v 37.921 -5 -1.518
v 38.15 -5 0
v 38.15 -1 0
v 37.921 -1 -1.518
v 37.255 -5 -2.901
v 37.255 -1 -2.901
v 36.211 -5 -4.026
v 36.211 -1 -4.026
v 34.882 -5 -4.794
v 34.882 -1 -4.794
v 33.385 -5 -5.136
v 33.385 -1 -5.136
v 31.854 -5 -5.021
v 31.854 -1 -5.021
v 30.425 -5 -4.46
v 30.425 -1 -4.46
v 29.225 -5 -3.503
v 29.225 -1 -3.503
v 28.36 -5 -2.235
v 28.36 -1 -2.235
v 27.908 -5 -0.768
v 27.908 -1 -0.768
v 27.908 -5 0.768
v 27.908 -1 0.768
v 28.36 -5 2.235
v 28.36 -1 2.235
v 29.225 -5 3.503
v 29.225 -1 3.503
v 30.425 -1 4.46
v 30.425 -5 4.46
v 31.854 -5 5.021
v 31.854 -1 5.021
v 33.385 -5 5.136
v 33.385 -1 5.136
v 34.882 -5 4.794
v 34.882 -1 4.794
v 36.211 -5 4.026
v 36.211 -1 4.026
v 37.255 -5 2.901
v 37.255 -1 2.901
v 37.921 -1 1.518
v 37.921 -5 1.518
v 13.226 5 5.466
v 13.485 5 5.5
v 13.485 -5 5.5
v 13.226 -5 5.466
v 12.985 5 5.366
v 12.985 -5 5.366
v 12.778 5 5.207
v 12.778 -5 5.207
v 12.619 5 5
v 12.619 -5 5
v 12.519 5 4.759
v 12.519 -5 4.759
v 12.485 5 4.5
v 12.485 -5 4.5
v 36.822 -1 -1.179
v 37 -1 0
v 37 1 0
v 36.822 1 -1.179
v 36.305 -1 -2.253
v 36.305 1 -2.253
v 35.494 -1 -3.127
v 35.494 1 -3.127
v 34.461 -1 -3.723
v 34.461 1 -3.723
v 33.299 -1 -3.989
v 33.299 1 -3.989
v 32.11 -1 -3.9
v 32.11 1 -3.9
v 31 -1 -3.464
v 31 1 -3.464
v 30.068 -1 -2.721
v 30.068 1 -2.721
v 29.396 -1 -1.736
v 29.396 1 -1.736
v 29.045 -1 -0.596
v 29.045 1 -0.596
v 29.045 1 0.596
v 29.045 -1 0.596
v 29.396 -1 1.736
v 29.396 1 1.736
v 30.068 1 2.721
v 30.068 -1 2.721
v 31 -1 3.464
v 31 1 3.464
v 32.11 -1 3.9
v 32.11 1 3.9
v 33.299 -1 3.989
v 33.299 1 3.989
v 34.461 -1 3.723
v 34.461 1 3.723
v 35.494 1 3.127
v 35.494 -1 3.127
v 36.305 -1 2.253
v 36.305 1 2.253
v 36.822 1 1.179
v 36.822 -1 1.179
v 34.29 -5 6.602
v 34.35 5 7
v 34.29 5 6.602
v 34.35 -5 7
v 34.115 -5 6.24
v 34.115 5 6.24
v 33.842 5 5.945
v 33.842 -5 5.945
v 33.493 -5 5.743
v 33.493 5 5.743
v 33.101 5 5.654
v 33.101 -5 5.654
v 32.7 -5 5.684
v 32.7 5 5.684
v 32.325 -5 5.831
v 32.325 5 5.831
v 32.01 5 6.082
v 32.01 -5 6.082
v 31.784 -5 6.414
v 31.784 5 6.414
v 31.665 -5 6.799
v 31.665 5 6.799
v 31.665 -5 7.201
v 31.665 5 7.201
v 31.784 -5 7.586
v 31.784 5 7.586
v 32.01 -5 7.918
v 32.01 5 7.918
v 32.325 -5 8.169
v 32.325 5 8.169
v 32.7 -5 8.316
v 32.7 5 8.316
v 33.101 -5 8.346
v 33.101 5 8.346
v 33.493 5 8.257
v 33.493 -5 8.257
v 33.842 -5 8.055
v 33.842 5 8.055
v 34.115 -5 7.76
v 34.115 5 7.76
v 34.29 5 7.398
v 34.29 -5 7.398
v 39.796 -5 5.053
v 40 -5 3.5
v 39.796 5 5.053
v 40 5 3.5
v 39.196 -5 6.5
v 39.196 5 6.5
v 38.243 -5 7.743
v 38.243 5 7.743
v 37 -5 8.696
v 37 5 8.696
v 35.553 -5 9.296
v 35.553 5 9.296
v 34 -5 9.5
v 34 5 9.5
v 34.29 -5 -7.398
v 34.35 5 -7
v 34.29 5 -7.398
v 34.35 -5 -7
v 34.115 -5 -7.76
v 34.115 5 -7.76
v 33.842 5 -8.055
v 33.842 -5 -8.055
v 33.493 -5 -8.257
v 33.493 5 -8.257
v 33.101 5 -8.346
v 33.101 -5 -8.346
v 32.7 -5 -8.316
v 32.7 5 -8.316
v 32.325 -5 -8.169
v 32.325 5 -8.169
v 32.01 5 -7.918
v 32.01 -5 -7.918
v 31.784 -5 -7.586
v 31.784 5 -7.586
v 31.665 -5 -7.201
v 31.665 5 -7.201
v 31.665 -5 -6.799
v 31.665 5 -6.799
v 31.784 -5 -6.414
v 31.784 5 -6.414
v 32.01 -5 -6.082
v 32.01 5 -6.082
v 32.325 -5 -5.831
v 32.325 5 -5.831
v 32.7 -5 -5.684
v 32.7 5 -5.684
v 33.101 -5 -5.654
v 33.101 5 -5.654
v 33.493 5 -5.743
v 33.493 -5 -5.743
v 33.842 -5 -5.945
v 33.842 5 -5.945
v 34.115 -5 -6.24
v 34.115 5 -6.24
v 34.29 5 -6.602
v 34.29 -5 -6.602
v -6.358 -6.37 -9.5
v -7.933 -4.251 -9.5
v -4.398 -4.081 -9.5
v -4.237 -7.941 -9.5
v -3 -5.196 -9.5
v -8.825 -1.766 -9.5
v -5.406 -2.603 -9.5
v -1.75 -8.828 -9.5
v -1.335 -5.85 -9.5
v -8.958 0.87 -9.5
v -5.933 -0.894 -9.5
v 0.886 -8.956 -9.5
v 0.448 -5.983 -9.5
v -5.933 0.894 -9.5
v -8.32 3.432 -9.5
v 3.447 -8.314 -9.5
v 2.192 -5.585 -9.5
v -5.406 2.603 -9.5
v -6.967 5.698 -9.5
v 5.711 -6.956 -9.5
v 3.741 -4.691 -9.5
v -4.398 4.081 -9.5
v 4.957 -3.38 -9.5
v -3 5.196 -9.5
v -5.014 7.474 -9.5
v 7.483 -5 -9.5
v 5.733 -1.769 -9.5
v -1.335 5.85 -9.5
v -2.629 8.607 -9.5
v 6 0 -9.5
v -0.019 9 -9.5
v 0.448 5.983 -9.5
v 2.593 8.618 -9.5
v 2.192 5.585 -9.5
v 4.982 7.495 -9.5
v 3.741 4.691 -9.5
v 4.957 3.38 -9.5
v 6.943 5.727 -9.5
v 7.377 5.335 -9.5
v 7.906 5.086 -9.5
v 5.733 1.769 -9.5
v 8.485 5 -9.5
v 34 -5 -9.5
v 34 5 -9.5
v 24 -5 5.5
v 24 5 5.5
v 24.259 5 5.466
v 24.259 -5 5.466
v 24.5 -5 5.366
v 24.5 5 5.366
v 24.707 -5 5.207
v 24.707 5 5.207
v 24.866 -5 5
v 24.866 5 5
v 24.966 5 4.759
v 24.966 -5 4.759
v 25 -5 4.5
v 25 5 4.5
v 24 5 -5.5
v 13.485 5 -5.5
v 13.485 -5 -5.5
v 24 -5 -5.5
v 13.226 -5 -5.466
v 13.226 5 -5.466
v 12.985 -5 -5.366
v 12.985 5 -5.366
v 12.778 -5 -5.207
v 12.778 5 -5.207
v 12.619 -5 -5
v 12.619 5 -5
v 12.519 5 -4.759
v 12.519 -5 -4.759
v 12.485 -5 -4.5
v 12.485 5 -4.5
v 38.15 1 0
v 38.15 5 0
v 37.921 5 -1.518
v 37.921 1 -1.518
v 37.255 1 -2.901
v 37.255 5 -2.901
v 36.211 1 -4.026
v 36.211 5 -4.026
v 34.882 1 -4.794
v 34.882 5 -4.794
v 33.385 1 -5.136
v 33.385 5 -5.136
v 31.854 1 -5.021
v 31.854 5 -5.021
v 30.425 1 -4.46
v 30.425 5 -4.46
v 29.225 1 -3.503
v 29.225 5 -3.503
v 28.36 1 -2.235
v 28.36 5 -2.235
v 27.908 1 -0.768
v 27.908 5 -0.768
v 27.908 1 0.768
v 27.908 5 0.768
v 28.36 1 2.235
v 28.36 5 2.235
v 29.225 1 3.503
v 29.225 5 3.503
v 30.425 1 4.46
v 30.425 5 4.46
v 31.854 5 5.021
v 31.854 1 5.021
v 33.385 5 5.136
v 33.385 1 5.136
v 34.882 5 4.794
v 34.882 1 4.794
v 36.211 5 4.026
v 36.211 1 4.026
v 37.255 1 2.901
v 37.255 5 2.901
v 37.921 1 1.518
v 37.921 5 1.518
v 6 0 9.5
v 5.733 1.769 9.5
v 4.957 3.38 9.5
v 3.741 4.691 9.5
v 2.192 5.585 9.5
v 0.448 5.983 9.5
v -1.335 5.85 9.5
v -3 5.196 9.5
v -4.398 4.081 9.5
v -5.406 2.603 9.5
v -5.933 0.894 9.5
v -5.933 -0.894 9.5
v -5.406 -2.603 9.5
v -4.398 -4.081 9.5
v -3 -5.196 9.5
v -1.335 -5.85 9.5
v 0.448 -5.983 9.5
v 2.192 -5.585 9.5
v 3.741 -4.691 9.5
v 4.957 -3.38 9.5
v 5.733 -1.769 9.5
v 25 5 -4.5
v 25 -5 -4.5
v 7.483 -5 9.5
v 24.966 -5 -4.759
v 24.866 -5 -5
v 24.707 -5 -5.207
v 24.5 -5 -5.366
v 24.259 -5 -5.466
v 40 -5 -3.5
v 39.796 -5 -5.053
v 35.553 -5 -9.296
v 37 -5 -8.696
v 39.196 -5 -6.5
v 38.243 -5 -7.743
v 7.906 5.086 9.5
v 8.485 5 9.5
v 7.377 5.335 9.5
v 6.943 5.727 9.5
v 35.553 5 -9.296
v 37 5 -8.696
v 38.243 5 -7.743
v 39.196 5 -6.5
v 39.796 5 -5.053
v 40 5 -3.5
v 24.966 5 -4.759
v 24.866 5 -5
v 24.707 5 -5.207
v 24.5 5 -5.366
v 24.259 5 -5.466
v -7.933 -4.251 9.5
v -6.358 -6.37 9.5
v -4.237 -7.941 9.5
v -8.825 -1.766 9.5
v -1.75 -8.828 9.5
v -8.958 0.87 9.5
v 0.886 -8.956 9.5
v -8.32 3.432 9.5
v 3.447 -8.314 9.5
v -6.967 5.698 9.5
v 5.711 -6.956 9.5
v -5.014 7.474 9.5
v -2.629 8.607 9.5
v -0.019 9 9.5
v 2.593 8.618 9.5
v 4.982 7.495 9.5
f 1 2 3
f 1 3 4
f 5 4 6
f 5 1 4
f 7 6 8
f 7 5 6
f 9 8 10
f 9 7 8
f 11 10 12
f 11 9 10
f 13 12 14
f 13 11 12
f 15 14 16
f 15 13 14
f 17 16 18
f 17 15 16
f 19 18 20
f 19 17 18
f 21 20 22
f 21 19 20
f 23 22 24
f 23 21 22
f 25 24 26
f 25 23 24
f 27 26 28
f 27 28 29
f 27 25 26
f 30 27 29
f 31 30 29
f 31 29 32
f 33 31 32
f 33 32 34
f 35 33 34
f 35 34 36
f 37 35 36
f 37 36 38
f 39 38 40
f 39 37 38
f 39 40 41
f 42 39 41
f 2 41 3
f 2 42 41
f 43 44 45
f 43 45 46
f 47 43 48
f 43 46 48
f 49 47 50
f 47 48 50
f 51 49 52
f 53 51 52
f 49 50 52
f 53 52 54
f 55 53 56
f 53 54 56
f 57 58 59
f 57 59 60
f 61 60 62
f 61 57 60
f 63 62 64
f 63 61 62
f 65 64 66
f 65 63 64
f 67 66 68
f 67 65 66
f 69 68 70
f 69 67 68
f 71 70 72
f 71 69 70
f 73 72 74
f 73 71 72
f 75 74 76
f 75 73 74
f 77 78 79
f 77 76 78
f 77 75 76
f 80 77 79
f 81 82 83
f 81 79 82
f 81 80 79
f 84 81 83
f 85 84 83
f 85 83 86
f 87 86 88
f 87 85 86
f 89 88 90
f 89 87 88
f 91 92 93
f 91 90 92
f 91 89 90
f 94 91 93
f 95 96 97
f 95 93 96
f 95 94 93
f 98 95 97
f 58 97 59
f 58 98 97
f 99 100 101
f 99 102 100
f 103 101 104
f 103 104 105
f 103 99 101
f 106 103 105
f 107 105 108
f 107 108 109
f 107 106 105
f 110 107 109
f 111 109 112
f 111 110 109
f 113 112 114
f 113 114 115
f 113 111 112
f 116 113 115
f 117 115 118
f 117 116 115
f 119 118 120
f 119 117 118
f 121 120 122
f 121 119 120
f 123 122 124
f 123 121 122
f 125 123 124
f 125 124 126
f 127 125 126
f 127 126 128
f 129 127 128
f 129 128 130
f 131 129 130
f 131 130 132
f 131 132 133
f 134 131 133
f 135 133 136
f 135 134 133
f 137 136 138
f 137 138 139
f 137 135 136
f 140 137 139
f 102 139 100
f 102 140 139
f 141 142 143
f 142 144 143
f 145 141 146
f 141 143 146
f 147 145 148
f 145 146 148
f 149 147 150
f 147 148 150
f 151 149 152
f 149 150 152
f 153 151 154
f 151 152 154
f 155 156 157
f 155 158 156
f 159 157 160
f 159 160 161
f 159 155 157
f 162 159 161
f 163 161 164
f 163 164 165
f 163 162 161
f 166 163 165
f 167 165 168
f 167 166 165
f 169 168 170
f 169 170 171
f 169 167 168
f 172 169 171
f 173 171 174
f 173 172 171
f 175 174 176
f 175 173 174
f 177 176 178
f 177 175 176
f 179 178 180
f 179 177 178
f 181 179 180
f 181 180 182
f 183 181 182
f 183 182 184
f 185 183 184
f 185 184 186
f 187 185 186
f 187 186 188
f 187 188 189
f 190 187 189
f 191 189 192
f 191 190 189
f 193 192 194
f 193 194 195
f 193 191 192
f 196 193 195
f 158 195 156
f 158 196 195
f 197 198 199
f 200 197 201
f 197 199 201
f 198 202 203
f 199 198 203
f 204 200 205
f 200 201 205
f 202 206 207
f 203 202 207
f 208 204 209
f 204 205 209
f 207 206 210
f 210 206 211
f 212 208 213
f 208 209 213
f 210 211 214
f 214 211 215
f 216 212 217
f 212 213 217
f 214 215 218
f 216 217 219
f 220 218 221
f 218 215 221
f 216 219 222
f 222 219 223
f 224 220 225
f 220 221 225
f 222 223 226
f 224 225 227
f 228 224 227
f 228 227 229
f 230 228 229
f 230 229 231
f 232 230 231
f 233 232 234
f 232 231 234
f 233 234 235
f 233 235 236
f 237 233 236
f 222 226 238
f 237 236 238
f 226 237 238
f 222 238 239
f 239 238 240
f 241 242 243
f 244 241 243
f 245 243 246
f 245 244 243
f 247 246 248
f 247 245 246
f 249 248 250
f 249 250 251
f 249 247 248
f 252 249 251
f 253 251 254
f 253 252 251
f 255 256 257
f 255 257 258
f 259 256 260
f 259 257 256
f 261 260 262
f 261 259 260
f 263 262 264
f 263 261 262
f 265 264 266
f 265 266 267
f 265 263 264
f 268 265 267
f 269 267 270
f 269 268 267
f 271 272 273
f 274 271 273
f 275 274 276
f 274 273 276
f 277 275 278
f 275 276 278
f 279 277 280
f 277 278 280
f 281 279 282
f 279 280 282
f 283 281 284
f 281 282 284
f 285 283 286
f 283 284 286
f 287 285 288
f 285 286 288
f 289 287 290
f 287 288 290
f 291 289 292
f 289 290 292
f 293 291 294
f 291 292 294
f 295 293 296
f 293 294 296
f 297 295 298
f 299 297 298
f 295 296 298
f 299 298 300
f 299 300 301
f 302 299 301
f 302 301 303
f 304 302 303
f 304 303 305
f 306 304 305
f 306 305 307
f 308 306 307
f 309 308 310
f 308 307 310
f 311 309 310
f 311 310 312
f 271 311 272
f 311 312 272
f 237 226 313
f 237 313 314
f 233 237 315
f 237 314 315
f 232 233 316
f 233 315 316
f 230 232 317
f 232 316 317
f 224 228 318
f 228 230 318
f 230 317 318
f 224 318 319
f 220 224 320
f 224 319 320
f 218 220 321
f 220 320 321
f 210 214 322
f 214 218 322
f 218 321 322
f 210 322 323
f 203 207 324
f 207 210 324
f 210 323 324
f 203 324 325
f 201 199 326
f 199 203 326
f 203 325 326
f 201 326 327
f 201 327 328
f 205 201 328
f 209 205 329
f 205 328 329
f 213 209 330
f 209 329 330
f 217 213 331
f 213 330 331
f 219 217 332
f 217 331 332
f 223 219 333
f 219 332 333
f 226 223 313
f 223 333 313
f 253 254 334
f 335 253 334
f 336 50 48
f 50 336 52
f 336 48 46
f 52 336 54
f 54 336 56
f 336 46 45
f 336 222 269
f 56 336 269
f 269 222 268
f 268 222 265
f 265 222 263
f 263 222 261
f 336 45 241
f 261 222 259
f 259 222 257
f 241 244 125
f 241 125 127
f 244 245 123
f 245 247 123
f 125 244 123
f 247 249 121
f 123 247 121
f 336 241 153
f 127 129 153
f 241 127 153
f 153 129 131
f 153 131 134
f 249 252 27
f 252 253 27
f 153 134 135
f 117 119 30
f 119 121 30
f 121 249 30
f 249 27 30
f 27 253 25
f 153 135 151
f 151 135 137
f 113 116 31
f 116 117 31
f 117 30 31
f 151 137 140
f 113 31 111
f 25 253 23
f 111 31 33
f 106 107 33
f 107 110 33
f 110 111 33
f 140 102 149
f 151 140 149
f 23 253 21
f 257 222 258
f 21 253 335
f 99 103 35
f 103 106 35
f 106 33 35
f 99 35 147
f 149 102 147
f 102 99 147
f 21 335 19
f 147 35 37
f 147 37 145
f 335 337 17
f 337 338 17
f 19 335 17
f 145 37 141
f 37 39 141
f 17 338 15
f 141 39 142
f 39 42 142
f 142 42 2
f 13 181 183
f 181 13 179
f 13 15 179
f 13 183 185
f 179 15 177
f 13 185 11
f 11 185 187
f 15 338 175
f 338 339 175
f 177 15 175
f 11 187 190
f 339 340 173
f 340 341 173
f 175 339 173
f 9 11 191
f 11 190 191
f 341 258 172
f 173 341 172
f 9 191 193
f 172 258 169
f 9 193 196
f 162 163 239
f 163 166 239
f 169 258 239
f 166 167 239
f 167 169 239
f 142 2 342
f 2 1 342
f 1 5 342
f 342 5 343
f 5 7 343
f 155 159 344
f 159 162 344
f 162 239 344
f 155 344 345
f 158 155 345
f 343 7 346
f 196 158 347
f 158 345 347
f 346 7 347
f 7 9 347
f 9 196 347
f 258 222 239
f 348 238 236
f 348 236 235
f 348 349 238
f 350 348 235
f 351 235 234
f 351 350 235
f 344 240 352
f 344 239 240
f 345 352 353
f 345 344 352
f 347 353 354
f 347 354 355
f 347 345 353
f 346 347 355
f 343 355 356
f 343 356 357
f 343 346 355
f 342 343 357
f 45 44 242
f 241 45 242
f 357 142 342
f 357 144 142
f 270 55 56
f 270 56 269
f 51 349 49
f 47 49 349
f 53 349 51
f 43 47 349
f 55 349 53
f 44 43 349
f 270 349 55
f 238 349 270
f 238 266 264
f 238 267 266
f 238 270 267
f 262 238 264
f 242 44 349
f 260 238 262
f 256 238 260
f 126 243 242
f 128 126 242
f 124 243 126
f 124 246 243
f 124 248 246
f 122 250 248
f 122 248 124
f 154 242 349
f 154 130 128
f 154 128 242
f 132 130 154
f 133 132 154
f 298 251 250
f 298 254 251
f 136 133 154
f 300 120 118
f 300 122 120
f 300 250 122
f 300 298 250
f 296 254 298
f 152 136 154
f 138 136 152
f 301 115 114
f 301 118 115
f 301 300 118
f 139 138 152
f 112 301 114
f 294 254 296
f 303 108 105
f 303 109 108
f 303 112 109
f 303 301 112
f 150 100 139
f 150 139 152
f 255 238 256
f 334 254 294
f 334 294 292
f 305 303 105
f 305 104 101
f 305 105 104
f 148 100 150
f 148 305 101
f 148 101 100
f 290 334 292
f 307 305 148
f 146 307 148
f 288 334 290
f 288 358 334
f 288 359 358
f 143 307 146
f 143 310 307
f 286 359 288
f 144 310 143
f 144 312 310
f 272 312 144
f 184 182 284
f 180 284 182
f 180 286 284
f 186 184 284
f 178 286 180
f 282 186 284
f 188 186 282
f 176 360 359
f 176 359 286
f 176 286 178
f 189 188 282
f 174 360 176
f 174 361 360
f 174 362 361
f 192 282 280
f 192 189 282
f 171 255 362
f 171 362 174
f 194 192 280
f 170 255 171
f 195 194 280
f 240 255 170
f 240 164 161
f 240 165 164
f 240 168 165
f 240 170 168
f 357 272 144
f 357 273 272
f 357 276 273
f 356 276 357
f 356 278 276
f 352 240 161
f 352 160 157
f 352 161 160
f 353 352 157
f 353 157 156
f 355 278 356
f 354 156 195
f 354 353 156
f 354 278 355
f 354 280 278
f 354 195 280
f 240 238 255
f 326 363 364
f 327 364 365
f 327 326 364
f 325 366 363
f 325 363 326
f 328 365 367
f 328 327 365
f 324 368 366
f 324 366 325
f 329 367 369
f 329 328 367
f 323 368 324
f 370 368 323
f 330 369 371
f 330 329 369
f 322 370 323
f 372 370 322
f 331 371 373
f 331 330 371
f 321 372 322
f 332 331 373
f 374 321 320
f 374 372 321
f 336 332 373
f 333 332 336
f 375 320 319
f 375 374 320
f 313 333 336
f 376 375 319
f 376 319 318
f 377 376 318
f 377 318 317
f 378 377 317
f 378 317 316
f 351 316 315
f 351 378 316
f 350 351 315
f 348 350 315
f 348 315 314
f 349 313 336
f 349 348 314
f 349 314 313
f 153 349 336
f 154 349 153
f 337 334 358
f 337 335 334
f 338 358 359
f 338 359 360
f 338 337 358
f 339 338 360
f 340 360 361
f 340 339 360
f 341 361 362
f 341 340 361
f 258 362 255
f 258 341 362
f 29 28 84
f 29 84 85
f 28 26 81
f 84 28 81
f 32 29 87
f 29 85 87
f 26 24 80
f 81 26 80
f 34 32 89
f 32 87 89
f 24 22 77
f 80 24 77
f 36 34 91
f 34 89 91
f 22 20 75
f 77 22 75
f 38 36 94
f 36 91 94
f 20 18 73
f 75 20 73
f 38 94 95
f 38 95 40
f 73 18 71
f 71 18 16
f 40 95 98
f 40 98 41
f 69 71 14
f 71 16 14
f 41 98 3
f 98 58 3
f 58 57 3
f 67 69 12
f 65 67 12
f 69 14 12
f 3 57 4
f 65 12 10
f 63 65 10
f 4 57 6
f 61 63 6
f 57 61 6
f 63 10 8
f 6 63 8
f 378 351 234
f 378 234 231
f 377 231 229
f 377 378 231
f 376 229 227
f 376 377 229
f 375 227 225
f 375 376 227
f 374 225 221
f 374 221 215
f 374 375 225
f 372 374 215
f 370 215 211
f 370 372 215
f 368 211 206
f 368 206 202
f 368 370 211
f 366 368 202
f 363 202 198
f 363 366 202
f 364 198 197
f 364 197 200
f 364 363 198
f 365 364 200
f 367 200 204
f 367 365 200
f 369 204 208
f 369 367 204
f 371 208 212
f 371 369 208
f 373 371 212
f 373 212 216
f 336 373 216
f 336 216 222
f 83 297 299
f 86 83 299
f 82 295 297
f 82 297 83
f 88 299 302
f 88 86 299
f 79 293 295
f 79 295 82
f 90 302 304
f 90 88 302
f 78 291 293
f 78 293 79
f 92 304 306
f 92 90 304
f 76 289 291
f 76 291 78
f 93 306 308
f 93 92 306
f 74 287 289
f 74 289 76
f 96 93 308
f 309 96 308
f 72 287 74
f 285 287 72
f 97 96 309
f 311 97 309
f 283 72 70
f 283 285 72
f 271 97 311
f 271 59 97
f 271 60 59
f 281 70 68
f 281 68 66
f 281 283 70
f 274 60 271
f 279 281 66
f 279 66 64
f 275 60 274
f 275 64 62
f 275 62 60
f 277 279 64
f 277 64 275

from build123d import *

# Parameters (mm, degrees)
SKETCH1_R                  = 9
SKETCH1_R_2                = 6
MAIN_DEPTH                 = 9.5
SKETCH2_W                  = 40
SKETCH2_H                  = 19
SKETCH2_R                  = 4
SKETCH2_R_2                = 1.35
BALLSUPPORTEXTRUSION_DEPTH = 5
SKETCH3_R                  = 5.15
BALLSUPPORTHOLE_DEPTH      = 4
FILLET2_R                  = 2
SKETCH5_R                  = 6
CUT_EXTRUDE2_DEPTH         = 20
SKETCH6_W                  = 12.514718626
SKETCH6_H                  = 11
CUT_EXTRUDE3_DEPTH         = 15
FILLET3_R                  = 1
FILLET4_R                  = 6


with BuildPart() as part:
    # Sketch1 → Main (new body, symmetric)
    with BuildSketch(Plane.XY):
        Circle(SKETCH1_R)
        Circle(SKETCH1_R_2, mode=Mode.SUBTRACT)
    extrude(amount=MAIN_DEPTH, both=True)

    # Sketch2 → BallSupportExtrusion (add, symmetric)
    with BuildSketch(Plane(origin=(0, 0, 0), x_dir=(1, 0, 0), z_dir=(0, 1, 0))):
        with Locations((20, 0)):
            Rectangle(SKETCH2_W, SKETCH2_H)
        with Locations((33, 0)):
            Circle(SKETCH2_R, mode=Mode.SUBTRACT)
        with Locations((33, 7)):
            Circle(SKETCH2_R_2, mode=Mode.SUBTRACT)
        with Locations((33, -7)):
            Circle(SKETCH2_R_2, mode=Mode.SUBTRACT)
    extrude(amount=BALLSUPPORTEXTRUSION_DEPTH, both=True)

    # Sketch3 → BallSupportHole (cut)
    with BuildSketch(Plane(origin=(0, 5, 0), x_dir=(1, 0, 0), z_dir=(0, 1, 0))):
        with Locations((33, 0)):
            Circle(SKETCH3_R)
    ballsupporthole = extrude(amount=-BALLSUPPORTHOLE_DEPTH, mode=Mode.SUBTRACT)

    # Fillet2
    fillet2_edges = [part.edges().sort_by_distance(p)[0] for p in [
        (7.483314774, 5, 0),
    ]]
    fillet(fillet2_edges, radius=FILLET2_R)

    # Sketch5 → Cut-Extrude2 (cut, through all)
    with BuildSketch(Plane.XY.offset(9.5)):
        Circle(SKETCH5_R)
    extrude(amount=-CUT_EXTRUDE2_DEPTH, mode=Mode.SUBTRACT)

    # Mirror1: BallSupportHole across plane
    add(ballsupporthole.mirror(Plane.ZX), mode=Mode.SUBTRACT)

    # Sketch6 → Cut-Extrude3 (cut, through all)
    with BuildSketch(Plane(origin=(0, 5, 0), x_dir=(1, 0, 0), z_dir=(0, 1, 0))):
        with Locations((18.742640687, 0)):
            Rectangle(SKETCH6_W, SKETCH6_H)
    extrude(amount=-CUT_EXTRUDE3_DEPTH, mode=Mode.SUBTRACT)

    # Fillet3
    fillet3_edges = [part.edges().sort_by_distance(p)[0] for p in [
        (12.485281374, 0, 5.5),
        (12.485281374, 0, -5.5),
        (25, 0, -5.5),
        (25, 0, 5.5),
    ]]
    fillet(fillet3_edges, radius=FILLET3_R)

    # Fillet4
    fillet4_edges = [part.edges().sort_by_distance(p)[0] for p in [
        (40, 0, 9.5),
        (40, 0, -9.5),
    ]]
    fillet(fillet4_edges, radius=FILLET4_R)


solid = part.part
